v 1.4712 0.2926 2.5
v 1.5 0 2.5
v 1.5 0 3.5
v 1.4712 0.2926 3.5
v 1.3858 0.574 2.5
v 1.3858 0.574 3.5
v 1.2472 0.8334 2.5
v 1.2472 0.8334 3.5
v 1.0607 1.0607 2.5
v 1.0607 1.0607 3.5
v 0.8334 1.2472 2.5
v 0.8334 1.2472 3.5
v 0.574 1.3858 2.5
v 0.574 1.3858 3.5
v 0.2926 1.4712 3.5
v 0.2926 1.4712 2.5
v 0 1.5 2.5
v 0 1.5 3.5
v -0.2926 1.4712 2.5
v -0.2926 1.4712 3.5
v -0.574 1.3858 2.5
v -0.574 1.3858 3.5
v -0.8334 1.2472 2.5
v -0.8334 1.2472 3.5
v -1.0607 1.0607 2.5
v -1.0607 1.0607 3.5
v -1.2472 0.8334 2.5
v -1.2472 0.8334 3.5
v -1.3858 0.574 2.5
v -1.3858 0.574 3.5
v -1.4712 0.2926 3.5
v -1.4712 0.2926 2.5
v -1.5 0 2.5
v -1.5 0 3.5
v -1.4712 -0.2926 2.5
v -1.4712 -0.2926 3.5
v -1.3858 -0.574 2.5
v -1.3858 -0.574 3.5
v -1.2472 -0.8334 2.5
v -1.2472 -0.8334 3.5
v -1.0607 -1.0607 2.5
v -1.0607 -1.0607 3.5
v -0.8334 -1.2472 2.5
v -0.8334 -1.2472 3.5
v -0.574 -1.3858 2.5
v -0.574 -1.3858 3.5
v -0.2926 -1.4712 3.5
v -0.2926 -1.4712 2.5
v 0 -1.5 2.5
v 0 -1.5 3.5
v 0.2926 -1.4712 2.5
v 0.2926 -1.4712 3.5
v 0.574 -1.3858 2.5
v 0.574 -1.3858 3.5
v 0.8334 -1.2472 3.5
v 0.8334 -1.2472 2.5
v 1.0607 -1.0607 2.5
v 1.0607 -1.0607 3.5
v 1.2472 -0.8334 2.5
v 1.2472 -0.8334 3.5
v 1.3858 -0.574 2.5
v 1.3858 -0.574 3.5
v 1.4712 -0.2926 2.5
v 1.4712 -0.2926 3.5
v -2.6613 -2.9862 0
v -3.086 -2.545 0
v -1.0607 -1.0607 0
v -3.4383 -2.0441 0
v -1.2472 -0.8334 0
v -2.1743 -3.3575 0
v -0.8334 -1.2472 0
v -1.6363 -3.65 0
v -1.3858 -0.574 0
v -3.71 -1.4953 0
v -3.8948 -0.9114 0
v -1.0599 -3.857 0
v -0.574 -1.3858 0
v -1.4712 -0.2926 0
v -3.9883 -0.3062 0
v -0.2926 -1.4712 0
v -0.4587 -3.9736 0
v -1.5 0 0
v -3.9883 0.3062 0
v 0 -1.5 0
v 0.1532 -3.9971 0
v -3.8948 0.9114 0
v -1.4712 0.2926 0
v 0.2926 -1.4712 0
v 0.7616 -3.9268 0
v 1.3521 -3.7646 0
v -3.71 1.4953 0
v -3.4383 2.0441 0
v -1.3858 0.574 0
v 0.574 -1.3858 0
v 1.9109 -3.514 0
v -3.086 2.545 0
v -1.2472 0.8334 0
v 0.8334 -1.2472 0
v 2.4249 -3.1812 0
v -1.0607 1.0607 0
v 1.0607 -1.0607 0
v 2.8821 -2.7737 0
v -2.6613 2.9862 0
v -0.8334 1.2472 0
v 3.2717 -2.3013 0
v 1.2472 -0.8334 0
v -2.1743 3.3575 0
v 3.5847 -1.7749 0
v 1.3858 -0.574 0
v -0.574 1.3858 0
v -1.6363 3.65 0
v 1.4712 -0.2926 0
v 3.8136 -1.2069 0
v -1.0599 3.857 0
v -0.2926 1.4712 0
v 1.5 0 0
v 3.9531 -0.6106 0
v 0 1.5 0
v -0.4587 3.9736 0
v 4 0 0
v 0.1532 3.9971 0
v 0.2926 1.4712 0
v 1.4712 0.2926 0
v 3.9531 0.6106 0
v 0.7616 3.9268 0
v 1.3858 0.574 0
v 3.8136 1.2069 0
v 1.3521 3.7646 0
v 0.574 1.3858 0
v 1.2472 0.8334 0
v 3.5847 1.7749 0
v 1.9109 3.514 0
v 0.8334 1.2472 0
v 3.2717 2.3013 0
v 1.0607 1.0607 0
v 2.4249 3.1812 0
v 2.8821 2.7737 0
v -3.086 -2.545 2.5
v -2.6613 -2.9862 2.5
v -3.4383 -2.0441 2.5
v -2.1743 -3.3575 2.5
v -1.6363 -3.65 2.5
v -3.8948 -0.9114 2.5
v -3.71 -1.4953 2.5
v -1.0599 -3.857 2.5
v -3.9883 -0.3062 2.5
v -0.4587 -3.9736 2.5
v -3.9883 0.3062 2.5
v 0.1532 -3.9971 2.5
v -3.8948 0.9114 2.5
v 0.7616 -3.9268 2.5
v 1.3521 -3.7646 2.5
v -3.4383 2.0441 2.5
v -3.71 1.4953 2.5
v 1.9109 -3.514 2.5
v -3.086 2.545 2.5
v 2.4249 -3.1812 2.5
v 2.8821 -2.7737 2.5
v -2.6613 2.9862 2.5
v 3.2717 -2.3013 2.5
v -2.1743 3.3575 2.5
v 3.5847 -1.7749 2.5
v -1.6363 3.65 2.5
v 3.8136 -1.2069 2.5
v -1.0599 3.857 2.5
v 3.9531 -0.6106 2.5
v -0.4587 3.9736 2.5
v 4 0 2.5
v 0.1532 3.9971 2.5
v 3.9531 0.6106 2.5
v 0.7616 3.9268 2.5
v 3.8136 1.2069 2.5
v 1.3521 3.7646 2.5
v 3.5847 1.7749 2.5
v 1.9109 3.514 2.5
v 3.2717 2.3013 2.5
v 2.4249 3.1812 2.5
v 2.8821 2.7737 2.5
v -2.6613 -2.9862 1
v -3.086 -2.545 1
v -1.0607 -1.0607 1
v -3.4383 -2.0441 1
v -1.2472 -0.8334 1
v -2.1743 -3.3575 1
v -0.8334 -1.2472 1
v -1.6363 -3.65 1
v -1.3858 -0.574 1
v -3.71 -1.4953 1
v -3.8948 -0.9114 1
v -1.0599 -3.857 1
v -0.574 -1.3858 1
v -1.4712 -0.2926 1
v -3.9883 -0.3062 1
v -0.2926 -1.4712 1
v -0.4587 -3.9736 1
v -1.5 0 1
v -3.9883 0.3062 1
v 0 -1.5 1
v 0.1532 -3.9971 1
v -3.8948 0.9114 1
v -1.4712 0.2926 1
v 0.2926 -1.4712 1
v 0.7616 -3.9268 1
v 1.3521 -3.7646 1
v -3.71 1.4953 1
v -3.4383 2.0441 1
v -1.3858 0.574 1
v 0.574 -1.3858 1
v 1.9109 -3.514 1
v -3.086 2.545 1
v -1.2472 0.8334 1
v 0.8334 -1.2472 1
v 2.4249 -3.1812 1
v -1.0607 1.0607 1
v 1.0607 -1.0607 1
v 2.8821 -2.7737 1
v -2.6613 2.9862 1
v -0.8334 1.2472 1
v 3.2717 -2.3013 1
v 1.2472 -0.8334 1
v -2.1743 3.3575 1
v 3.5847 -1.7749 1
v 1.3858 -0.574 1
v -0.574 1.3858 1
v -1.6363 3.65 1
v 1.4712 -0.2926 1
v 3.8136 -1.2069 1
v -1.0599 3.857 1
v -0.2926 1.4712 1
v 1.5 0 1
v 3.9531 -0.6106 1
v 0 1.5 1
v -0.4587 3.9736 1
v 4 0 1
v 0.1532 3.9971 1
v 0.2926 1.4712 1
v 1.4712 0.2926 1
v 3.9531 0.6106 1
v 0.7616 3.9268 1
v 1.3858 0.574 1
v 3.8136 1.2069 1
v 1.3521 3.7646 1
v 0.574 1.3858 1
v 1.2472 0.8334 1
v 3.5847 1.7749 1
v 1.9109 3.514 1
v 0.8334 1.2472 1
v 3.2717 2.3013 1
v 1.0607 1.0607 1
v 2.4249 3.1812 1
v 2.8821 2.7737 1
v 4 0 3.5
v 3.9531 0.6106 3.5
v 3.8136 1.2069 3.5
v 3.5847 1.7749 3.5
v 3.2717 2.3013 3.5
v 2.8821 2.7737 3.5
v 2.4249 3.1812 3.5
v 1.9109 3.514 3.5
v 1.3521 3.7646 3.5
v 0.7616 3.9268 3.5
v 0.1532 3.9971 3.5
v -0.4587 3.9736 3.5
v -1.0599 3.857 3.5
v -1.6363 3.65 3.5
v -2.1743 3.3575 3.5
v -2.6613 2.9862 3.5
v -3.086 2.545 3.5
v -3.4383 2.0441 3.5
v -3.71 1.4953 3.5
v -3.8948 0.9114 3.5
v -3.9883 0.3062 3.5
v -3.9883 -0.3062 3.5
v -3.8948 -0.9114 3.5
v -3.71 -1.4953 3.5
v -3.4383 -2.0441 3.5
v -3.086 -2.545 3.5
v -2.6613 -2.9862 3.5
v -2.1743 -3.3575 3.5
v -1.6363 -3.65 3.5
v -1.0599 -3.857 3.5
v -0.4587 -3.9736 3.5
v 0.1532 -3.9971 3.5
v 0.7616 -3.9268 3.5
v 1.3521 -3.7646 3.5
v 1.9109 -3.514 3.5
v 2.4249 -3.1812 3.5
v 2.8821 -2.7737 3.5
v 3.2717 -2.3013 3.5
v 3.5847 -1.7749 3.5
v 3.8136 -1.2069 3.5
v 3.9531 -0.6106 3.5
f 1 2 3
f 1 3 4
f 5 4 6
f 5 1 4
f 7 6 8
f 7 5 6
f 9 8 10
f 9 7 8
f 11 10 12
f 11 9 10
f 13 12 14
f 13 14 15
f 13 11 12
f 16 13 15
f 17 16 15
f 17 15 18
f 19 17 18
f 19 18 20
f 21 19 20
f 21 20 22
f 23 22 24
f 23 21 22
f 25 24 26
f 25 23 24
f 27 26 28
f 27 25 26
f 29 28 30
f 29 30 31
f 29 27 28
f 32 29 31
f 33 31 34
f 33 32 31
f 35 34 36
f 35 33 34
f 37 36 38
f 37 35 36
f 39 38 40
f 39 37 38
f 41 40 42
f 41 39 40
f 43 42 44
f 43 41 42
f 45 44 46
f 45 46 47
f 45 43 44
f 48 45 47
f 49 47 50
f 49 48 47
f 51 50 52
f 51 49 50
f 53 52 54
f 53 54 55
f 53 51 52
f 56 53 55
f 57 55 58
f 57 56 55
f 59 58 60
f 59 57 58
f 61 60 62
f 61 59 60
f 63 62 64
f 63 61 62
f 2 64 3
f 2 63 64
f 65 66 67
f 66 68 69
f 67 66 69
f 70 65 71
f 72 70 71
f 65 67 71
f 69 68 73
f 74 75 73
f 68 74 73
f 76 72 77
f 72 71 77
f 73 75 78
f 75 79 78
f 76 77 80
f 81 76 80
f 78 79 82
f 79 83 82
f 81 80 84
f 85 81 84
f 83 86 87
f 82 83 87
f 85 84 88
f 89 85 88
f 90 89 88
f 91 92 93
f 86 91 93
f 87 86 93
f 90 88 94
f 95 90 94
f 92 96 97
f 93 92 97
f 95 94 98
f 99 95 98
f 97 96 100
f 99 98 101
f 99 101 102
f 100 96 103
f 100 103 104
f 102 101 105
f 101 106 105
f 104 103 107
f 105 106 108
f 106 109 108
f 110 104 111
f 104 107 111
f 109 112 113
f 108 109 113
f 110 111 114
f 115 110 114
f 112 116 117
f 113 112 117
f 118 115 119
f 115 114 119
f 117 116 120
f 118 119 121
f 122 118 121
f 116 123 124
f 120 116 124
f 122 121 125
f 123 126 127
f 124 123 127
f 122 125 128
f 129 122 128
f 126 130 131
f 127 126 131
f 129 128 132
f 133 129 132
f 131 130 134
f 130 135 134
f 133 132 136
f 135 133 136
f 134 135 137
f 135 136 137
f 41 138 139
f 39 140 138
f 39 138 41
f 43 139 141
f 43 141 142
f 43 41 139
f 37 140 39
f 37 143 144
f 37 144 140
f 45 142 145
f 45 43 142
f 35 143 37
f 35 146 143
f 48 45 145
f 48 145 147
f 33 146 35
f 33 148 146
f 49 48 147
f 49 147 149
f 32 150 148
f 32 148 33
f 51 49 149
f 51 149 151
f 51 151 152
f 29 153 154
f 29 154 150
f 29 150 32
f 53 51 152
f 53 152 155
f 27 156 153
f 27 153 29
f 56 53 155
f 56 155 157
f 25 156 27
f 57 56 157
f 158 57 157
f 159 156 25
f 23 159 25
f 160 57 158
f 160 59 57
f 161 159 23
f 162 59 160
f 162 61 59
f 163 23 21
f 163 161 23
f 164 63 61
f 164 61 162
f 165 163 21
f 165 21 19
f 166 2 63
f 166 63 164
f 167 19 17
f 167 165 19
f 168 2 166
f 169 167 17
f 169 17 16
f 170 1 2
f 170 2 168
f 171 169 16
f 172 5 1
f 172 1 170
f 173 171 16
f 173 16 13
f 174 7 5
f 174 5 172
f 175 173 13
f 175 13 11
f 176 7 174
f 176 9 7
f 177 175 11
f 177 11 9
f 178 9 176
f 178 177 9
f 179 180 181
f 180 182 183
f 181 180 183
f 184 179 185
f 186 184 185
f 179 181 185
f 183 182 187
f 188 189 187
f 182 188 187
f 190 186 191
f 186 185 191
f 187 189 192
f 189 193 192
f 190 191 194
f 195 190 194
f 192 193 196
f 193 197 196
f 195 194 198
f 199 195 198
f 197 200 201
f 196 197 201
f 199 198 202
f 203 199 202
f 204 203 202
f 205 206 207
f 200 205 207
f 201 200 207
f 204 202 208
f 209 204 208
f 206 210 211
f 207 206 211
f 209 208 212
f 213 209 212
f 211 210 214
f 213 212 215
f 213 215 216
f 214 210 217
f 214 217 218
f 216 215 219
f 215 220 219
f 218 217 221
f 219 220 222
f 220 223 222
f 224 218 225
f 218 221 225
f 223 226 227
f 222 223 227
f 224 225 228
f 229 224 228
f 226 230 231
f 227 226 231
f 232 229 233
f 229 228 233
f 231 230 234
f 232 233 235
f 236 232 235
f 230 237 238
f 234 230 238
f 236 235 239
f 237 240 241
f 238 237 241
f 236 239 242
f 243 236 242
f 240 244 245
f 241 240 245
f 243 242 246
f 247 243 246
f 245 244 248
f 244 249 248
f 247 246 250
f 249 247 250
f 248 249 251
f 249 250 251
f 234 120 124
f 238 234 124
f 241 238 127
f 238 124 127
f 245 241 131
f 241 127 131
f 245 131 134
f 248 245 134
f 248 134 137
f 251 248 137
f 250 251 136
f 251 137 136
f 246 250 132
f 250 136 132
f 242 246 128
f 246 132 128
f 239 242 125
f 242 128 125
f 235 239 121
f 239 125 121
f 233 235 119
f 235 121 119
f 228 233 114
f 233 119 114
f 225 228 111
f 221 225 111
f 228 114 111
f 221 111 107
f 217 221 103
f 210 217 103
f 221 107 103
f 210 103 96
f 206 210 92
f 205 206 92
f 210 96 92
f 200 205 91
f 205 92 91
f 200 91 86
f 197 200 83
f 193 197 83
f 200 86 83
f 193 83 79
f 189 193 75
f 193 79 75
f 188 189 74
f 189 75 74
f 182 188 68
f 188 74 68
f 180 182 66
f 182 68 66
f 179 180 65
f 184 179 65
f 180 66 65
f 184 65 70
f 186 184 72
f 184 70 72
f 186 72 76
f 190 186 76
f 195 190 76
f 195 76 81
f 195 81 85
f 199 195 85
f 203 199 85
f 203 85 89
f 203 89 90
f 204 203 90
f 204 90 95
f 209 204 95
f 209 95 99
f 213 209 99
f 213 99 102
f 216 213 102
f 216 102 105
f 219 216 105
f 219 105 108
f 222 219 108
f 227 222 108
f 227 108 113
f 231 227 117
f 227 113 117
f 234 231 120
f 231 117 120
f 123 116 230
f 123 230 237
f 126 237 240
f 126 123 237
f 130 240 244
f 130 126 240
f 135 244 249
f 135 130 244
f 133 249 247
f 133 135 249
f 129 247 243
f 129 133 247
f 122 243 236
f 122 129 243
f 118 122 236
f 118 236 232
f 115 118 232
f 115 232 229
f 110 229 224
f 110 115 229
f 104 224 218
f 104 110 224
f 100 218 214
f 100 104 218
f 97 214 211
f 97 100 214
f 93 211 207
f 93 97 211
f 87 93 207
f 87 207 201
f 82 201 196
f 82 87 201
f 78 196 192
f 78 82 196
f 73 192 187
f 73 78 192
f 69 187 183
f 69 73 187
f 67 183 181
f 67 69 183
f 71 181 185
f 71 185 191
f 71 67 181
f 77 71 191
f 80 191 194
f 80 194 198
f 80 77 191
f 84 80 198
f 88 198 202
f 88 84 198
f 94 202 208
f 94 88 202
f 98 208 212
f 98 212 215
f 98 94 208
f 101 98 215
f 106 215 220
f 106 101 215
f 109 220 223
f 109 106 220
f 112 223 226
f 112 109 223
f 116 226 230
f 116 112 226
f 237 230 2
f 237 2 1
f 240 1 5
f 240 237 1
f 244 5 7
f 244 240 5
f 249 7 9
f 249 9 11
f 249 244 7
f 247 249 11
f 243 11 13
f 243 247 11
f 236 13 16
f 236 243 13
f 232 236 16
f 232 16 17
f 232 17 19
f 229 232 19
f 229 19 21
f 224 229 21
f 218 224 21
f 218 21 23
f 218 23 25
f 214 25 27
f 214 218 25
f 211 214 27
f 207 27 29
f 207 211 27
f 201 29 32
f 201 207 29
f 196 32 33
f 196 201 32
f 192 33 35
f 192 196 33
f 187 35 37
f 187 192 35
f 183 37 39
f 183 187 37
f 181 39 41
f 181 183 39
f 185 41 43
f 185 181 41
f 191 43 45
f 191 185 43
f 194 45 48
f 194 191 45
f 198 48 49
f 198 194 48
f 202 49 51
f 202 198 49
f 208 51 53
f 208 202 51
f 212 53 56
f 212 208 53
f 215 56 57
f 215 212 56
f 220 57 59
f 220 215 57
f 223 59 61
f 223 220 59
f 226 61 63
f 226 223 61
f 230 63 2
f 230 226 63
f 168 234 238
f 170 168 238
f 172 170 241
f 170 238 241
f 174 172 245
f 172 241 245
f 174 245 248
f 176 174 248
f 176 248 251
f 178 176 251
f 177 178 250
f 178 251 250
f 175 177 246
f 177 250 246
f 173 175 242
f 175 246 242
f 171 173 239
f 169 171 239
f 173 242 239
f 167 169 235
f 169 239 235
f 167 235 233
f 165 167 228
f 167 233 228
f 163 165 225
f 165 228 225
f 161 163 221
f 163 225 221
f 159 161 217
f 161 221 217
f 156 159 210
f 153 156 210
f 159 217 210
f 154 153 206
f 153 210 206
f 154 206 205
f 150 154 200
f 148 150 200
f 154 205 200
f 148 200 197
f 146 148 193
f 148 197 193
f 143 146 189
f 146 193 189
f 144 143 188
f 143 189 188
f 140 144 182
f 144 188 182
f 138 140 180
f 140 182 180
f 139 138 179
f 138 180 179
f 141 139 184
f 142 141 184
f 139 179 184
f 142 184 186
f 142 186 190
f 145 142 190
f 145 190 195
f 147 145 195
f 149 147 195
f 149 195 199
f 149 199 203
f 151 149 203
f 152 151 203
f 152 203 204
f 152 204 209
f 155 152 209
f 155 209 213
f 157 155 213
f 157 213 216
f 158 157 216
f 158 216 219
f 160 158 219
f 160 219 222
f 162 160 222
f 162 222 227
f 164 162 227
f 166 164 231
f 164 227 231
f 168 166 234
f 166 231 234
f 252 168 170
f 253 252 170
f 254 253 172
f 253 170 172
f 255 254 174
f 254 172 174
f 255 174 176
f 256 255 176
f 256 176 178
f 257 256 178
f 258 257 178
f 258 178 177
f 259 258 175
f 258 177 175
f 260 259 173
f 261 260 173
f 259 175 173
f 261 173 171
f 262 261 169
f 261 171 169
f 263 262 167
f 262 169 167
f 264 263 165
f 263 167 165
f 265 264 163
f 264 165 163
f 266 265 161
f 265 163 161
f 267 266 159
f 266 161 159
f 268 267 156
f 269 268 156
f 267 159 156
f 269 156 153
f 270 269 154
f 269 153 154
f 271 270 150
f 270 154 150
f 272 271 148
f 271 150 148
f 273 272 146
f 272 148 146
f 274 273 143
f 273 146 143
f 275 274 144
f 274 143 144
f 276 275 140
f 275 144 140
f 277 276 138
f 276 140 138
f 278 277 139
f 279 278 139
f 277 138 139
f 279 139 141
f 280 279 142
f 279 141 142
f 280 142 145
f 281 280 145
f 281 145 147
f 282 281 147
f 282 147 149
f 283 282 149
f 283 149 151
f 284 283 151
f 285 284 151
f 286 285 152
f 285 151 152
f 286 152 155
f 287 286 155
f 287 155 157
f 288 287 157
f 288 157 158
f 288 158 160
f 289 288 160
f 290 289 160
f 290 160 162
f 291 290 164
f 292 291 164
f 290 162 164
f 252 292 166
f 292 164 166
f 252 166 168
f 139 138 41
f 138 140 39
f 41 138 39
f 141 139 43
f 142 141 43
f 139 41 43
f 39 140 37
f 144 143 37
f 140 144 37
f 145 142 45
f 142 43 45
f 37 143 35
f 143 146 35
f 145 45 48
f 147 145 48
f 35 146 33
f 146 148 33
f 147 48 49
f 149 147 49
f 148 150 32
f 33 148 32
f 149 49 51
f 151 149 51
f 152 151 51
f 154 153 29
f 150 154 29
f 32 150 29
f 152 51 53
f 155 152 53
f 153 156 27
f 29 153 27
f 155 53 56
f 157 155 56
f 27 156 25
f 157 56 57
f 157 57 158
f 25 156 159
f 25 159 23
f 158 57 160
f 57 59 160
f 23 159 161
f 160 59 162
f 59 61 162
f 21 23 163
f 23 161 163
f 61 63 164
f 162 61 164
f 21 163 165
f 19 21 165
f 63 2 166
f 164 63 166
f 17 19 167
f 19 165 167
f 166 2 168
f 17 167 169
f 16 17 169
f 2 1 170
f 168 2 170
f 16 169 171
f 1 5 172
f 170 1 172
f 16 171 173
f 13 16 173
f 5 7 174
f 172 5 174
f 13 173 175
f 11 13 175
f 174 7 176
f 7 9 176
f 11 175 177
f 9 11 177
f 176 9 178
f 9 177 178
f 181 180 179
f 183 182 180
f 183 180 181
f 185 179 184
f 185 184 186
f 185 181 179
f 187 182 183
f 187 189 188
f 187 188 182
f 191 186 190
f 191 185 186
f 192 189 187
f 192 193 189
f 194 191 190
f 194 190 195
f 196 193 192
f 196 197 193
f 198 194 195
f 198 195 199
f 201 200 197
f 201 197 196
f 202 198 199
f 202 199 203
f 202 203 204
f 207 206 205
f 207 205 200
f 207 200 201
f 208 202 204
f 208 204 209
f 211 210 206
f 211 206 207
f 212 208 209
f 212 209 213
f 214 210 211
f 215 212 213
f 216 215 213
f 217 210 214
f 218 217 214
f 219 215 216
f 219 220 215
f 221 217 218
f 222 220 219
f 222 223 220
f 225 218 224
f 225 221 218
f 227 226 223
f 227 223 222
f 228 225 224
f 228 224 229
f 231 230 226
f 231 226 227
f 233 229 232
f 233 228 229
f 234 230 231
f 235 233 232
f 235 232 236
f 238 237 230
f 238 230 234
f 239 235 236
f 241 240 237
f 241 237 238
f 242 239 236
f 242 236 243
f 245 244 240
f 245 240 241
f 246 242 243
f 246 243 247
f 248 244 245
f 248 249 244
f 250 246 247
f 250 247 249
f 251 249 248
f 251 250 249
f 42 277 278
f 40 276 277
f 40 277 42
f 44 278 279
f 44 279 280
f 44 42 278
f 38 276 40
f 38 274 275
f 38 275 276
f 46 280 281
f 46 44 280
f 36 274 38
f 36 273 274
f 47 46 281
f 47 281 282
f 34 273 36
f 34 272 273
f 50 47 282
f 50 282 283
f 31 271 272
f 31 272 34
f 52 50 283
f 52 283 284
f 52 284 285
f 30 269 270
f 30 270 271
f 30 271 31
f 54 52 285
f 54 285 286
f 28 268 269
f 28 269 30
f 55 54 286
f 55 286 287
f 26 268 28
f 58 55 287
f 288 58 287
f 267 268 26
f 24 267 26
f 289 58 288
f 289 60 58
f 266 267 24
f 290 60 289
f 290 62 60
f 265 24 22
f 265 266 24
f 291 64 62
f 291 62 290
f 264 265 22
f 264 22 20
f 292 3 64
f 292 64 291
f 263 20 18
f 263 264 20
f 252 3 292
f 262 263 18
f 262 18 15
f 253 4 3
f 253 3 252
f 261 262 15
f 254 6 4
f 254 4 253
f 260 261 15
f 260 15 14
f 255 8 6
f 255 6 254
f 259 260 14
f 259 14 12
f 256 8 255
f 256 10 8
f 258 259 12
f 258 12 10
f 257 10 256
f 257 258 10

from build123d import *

# Parameters (mm, degrees)
CROQUIS1_R              = 4
CROQUIS1_R_2            = 1.5
SALIENTE_EXTRUIR1_DEPTH = 1
CROQUIS2_R              = 4
CROQUIS2_R_2            = 1.5
SALIENTE_EXTRUIR2_DEPTH = 1.5
CROQUIS3_R              = 4
CROQUIS3_R_2            = 1.5
SALIENTE_EXTRUIR3_DEPTH = 1


with BuildPart() as part:
    # Croquis1 → Saliente-Extruir1 (new body)
    with BuildSketch(Plane.XY):
        Circle(CROQUIS1_R)
        Circle(CROQUIS1_R_2, mode=Mode.SUBTRACT)
    extrude(amount=SALIENTE_EXTRUIR1_DEPTH)


with BuildPart() as body_2:
    # Croquis2 → Saliente-Extruir2 (new body)
    with BuildSketch(Plane.XY.offset(1)):
        Circle(CROQUIS2_R)
        Circle(CROQUIS2_R_2, mode=Mode.SUBTRACT)
    extrude(amount=SALIENTE_EXTRUIR2_DEPTH)


with BuildPart() as body_3:
    # Croquis3 → Saliente-Extruir3 (new body)
    with BuildSketch(Plane.XY.offset(2.5)):
        Circle(CROQUIS3_R)
        Circle(CROQUIS3_R_2, mode=Mode.SUBTRACT)
    extrude(amount=SALIENTE_EXTRUIR3_DEPTH)


solid = Compound([part.part, body_2.part, body_3.part])
